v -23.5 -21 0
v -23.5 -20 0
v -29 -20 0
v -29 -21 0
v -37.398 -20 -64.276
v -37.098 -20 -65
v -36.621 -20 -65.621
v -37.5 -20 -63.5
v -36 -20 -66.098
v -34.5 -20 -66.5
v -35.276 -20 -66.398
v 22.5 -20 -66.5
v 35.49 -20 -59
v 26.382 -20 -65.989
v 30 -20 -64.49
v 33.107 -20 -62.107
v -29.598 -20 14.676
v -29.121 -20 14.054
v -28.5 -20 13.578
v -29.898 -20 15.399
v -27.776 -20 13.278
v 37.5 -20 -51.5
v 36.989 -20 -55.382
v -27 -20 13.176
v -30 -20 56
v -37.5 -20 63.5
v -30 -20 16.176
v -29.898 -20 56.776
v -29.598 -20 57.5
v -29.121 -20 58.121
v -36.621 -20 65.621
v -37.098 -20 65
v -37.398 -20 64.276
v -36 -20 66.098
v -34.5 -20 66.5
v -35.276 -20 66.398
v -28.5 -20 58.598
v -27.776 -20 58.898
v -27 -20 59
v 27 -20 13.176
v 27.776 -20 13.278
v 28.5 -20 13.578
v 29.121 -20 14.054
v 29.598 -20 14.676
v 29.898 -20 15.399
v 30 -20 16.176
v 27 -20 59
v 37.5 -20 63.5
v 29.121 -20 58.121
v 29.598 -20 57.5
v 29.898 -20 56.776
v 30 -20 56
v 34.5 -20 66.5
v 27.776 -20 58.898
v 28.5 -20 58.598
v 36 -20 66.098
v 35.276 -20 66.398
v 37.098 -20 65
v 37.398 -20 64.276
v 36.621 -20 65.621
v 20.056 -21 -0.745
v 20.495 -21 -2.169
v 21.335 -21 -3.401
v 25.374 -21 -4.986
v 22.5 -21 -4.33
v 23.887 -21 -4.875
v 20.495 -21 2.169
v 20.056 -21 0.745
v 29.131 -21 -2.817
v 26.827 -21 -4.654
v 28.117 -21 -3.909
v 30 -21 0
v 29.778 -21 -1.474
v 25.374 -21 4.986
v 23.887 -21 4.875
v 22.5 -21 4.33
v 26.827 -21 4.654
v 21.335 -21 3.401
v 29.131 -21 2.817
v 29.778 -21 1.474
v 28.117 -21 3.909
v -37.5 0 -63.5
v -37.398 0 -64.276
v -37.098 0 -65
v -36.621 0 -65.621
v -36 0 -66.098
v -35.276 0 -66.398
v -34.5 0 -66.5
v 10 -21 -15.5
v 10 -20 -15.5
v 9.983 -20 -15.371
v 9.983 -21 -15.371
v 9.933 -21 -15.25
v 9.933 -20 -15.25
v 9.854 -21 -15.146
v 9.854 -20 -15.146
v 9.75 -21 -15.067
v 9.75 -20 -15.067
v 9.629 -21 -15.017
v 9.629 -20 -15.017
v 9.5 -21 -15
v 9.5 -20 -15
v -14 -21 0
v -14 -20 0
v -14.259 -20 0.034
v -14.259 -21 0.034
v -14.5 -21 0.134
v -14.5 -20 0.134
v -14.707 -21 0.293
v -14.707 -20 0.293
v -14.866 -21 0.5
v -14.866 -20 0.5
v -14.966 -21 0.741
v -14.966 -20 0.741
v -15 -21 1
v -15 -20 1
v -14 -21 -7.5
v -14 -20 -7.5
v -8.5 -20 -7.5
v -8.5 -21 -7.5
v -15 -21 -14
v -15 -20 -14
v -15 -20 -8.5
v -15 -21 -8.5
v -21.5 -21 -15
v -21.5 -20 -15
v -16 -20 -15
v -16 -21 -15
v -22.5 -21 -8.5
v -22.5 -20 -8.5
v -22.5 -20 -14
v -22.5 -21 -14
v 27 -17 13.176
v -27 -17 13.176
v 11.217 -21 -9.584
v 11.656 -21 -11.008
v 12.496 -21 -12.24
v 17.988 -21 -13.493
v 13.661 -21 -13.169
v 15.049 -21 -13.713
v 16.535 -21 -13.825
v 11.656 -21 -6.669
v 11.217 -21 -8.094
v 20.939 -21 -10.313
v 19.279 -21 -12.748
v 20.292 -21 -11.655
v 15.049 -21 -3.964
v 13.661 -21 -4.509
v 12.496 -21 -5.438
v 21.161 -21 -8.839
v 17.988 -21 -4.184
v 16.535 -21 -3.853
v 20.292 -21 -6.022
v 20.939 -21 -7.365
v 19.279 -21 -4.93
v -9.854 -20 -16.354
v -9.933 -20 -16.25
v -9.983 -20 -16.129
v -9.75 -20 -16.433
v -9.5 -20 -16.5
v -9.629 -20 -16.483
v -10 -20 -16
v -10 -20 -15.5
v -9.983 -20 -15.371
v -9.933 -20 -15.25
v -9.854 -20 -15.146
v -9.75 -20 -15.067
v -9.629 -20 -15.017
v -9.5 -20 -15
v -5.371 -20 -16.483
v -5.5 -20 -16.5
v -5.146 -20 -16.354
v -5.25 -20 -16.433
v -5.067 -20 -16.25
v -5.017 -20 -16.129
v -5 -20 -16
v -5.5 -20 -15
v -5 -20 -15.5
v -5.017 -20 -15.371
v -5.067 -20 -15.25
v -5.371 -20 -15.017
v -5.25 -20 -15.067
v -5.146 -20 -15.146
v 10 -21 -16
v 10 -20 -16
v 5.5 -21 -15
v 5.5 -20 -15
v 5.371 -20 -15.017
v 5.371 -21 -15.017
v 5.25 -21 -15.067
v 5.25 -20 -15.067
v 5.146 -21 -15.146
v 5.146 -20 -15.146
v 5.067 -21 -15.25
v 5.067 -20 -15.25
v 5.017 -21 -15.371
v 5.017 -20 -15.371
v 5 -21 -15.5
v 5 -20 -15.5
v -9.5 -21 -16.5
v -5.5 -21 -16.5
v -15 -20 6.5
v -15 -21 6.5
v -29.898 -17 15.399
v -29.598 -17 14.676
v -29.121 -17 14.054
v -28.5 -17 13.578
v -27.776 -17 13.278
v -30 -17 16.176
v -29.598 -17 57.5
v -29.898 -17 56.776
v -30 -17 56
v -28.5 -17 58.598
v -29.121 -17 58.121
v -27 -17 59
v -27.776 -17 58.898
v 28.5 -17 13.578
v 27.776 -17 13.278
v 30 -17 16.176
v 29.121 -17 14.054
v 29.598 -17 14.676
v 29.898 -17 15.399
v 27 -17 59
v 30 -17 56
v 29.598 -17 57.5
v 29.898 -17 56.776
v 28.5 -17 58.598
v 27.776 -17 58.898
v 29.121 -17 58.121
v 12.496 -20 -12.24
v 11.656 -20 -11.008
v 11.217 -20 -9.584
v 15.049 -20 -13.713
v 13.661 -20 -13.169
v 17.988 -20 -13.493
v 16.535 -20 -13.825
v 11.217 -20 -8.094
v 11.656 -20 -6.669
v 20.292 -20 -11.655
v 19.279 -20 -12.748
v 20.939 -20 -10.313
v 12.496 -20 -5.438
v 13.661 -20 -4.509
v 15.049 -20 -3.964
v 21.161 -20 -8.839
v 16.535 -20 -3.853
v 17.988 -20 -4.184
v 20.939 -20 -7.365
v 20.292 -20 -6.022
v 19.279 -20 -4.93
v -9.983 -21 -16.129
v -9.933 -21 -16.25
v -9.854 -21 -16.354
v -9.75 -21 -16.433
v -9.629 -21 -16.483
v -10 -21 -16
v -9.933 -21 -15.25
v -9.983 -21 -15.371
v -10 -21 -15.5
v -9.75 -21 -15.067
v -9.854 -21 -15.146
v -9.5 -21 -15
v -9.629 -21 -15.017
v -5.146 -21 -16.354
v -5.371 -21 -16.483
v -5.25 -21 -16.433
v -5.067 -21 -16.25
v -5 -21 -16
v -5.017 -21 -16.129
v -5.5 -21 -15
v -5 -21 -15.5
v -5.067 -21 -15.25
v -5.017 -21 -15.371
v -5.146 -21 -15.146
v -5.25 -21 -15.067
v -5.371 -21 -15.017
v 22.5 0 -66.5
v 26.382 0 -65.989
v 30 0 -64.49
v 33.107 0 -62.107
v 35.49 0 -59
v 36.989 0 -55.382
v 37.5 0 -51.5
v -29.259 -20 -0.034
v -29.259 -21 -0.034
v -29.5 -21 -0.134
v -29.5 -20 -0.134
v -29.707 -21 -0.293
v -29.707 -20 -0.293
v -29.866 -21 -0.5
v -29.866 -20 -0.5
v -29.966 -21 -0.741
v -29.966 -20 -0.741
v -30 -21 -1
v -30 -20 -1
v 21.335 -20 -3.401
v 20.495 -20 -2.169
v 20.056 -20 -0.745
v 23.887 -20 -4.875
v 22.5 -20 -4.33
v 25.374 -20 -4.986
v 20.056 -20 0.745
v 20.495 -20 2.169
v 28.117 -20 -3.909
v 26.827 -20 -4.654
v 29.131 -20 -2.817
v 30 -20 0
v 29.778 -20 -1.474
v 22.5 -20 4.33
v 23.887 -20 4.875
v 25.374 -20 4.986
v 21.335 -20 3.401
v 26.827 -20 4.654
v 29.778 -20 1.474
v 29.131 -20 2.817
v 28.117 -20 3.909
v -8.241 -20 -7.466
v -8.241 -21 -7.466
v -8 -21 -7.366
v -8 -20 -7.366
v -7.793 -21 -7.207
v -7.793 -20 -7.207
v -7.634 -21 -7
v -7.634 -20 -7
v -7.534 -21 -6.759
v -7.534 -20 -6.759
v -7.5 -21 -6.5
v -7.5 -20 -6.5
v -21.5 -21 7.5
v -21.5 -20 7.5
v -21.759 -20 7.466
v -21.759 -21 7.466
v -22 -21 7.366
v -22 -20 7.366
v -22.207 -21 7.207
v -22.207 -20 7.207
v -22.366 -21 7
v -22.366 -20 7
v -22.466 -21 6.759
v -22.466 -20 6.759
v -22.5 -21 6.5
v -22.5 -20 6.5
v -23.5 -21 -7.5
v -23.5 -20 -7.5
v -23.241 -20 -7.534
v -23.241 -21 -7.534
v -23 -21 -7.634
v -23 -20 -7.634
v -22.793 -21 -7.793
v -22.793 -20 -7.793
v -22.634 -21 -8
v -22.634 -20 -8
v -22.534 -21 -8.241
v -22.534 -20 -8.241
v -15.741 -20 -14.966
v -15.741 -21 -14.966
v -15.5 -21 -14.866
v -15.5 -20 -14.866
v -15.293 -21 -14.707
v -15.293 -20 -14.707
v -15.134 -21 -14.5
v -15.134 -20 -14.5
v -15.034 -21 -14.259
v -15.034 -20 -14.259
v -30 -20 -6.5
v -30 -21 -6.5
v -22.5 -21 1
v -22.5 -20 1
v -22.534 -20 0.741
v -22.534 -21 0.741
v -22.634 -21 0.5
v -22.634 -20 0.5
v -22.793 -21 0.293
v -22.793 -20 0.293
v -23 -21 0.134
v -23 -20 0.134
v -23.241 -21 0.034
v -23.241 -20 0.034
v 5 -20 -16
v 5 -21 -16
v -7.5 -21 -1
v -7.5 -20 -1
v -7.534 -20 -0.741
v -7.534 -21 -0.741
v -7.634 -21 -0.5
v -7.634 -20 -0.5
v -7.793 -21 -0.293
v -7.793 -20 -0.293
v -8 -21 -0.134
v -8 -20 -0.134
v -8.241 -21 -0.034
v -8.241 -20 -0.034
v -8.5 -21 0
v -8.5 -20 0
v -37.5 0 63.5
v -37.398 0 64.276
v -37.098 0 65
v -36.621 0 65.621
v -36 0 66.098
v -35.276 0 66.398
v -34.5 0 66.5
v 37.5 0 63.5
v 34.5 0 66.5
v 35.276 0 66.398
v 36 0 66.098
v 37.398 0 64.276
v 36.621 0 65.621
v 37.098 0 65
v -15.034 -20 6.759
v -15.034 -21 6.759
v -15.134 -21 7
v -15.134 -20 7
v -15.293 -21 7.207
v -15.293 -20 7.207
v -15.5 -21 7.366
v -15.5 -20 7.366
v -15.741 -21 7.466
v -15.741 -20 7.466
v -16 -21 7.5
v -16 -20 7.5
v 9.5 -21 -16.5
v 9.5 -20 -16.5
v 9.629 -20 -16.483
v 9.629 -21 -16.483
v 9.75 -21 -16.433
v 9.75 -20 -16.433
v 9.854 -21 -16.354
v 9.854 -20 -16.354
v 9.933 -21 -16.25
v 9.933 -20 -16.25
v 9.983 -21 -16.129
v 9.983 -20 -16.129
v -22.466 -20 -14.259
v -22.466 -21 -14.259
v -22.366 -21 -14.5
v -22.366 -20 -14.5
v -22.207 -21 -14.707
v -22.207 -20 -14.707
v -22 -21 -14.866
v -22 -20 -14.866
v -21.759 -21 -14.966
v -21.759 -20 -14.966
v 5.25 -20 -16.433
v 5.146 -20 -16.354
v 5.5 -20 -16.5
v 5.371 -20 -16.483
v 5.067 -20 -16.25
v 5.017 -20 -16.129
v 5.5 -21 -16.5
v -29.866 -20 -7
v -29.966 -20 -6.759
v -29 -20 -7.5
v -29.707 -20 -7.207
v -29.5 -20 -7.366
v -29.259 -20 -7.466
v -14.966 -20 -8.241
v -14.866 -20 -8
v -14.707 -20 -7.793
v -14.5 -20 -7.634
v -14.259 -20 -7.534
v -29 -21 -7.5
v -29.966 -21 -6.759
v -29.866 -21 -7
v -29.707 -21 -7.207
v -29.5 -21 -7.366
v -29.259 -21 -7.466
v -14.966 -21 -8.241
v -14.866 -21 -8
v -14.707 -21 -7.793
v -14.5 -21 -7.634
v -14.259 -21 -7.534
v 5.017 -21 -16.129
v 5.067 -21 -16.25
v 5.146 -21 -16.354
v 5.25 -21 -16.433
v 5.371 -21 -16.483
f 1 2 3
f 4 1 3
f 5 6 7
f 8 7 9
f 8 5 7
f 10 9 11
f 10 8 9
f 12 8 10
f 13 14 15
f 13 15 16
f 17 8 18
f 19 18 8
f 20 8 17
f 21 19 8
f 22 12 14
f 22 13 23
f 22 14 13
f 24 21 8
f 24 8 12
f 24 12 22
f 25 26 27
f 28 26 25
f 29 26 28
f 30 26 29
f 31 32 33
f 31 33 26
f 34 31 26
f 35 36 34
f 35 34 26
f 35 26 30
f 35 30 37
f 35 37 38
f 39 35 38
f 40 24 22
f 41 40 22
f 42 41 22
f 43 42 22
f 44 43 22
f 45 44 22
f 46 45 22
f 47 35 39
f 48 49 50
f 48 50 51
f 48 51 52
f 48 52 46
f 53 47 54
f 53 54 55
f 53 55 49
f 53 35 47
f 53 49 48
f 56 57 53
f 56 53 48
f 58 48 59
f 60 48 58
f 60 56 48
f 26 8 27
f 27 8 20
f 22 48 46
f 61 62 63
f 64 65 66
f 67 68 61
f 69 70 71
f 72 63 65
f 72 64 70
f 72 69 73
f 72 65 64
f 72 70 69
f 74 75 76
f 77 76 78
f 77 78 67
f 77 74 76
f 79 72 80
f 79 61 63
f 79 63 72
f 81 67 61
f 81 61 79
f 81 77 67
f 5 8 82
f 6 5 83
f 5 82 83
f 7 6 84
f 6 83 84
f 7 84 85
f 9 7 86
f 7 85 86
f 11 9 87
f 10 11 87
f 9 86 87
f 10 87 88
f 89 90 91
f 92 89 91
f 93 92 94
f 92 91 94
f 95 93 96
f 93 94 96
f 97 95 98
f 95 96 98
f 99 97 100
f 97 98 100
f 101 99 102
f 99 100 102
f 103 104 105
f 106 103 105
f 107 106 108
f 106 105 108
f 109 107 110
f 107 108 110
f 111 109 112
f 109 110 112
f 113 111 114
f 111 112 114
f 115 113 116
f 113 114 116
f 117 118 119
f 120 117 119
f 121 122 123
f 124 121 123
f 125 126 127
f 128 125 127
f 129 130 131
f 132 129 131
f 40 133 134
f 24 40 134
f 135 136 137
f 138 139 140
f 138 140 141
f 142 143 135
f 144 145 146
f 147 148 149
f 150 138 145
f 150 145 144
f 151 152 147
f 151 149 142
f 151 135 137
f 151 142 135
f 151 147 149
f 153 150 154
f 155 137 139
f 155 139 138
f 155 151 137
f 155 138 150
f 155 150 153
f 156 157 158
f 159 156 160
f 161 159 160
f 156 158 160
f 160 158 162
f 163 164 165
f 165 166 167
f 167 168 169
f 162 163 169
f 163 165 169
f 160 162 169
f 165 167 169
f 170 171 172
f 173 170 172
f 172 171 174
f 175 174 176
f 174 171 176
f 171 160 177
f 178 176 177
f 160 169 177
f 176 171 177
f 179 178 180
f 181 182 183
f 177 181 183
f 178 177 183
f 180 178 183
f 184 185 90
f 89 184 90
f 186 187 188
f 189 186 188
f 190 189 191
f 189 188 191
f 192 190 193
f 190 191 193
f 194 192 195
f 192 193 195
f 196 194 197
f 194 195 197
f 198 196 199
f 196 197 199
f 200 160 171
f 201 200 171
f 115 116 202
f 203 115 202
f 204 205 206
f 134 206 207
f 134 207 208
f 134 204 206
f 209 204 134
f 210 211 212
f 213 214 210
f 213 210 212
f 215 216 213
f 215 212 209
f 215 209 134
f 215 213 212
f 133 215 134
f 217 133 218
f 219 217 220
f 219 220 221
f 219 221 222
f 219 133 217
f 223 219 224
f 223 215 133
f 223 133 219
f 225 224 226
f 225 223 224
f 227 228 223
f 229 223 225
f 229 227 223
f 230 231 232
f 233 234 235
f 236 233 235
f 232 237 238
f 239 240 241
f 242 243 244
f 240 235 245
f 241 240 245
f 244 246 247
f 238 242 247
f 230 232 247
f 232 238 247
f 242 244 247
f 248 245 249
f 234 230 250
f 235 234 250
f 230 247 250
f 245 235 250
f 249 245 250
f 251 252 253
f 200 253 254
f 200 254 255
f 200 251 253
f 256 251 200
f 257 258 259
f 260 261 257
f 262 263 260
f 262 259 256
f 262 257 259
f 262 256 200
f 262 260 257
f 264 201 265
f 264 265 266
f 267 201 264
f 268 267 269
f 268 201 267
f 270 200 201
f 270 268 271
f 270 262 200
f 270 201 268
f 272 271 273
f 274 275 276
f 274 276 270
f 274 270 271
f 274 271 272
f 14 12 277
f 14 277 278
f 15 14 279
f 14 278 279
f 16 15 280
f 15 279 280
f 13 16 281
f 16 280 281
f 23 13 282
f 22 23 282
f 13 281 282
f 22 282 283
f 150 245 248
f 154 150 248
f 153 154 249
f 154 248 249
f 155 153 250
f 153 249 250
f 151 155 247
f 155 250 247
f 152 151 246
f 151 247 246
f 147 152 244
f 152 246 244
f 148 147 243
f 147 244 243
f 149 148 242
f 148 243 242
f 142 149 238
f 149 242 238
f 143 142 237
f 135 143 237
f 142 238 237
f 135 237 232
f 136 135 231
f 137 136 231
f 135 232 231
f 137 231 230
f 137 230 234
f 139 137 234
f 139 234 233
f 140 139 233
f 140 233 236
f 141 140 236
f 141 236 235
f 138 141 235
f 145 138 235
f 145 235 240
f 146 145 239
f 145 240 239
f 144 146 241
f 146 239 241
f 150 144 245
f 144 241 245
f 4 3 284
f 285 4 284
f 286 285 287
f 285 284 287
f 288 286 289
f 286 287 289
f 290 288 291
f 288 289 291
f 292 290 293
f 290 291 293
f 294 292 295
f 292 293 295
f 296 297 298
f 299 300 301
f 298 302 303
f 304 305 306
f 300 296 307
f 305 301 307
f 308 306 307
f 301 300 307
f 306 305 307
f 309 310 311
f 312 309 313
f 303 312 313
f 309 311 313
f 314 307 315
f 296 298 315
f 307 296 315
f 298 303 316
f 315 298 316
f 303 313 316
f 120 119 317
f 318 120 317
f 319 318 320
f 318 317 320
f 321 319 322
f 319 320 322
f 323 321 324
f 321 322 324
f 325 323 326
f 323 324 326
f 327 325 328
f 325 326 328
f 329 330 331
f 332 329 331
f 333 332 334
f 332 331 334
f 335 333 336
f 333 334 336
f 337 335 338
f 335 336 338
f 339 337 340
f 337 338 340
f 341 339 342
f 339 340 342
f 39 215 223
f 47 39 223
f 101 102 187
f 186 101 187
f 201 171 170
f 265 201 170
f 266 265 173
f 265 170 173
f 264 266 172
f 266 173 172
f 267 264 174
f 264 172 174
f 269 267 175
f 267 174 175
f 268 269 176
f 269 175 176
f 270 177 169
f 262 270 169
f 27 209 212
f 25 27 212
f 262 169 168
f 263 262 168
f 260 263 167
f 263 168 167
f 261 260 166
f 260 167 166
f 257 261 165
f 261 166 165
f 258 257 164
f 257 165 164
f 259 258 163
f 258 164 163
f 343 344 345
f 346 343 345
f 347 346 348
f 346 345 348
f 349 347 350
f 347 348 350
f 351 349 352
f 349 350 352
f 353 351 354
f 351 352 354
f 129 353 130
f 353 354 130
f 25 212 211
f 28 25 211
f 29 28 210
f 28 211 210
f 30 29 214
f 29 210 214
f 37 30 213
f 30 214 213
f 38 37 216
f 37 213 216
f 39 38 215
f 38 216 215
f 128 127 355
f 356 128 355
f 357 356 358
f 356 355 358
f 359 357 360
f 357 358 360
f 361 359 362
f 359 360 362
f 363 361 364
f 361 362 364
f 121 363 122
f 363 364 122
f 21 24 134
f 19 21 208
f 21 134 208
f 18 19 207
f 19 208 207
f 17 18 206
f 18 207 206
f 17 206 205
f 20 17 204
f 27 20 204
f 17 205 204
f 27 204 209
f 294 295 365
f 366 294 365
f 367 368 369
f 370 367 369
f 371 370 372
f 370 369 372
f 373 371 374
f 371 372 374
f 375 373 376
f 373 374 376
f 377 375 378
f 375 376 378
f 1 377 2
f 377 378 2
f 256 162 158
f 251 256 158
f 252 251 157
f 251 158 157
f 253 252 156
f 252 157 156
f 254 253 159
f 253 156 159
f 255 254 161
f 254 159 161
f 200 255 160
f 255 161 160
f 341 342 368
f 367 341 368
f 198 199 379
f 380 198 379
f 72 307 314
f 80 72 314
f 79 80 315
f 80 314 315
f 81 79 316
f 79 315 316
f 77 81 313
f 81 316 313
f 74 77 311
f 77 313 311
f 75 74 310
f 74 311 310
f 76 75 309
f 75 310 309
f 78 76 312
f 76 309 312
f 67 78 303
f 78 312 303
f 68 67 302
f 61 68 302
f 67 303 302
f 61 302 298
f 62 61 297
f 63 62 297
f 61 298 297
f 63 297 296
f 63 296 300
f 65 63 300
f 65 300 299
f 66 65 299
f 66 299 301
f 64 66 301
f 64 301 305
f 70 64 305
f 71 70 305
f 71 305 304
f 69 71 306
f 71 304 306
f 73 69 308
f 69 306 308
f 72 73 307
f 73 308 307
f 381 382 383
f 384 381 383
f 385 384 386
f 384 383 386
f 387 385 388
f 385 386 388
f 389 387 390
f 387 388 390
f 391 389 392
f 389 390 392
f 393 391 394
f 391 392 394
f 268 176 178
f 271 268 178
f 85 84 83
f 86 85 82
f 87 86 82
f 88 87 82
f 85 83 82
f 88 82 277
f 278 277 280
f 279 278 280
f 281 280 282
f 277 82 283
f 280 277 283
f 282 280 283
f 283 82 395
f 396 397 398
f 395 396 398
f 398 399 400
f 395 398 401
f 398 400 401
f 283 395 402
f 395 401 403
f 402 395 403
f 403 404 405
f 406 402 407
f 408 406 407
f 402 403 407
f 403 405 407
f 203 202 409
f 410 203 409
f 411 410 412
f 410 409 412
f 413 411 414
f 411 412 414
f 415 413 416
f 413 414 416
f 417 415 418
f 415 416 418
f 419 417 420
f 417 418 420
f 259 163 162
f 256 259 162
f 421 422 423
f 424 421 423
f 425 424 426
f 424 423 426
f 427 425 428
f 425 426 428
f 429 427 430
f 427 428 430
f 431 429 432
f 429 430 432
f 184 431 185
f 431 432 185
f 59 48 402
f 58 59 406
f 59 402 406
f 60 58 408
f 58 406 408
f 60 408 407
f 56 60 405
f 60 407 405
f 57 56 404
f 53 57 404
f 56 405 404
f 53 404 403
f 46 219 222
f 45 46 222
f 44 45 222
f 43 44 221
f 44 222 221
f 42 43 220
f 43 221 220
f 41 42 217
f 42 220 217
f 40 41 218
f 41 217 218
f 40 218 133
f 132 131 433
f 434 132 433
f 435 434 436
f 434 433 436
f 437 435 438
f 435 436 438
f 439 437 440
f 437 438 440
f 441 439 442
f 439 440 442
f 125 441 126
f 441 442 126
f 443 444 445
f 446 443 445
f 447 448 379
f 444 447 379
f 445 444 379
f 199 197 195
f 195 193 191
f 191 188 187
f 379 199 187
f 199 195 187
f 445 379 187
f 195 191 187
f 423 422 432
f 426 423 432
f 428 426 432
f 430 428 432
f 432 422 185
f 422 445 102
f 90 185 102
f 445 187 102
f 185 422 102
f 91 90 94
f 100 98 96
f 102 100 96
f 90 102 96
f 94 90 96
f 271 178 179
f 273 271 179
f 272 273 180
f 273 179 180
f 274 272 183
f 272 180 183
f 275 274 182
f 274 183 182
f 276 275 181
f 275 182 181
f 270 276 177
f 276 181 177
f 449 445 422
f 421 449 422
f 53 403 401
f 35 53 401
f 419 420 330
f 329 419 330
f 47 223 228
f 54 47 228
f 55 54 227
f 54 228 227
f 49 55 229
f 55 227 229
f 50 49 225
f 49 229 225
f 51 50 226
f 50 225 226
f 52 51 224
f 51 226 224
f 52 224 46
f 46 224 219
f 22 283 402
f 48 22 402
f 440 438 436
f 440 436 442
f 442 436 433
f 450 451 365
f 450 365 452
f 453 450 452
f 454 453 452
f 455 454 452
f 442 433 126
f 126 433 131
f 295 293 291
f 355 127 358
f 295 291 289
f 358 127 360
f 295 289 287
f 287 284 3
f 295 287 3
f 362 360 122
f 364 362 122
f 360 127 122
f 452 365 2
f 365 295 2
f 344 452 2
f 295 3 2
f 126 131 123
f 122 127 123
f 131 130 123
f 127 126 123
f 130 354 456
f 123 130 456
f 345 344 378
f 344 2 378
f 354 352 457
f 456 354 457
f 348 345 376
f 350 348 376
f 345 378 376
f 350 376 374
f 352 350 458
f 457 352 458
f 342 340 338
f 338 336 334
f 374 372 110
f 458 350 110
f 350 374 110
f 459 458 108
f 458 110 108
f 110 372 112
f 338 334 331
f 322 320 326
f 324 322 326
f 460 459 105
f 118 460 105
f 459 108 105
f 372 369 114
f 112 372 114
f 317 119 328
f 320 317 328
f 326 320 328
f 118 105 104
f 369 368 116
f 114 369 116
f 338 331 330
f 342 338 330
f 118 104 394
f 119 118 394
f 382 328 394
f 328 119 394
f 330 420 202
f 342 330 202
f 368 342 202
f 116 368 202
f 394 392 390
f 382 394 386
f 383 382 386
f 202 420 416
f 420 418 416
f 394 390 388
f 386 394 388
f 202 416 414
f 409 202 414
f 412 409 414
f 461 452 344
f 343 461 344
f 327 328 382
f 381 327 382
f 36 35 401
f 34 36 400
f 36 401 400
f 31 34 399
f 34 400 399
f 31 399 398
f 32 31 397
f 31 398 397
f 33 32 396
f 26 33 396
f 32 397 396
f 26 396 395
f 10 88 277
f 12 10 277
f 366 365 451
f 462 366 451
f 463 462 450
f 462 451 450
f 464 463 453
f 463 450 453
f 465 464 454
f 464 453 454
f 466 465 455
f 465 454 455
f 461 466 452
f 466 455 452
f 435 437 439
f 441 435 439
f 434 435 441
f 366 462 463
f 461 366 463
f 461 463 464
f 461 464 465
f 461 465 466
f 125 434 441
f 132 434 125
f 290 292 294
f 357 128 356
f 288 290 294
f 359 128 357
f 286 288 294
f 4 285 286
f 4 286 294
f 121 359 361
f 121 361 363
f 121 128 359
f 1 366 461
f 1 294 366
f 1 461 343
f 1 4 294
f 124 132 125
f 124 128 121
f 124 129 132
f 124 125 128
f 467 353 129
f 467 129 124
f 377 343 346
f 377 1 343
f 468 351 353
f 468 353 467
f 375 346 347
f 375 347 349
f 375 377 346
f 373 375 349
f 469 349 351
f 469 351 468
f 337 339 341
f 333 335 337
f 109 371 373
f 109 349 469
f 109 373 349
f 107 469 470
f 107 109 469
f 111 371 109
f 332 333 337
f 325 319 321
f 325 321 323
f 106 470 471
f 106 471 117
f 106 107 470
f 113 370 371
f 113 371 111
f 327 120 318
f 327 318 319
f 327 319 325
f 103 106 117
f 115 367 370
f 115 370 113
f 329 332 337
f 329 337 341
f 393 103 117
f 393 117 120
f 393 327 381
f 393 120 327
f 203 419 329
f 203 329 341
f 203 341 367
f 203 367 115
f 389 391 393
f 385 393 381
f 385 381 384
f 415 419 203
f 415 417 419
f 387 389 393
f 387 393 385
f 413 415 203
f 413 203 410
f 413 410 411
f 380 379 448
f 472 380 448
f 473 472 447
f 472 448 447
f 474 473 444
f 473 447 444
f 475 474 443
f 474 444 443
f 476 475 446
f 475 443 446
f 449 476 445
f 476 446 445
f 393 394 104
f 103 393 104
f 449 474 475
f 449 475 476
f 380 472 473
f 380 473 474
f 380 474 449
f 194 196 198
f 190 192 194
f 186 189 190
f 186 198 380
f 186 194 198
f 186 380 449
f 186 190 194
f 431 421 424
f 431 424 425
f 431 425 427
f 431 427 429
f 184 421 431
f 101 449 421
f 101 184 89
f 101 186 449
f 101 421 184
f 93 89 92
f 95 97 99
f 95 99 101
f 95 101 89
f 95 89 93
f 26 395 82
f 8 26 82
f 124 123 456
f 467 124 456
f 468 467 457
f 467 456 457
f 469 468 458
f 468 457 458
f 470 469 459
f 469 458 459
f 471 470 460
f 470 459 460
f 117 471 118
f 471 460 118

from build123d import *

# Parameters (mm, degrees)
F1_DEPTH = 20
F2_DEPTH = 17
F3_R     = 5
F4_DEPTH = 1


with BuildPart() as f1:
    # F0 (on Front) → F1 (new body)
    with BuildSketch(Plane.XZ):
        with BuildLine():
            ThreePointArc((37.5, 63.5), (36.62132, 65.62132), (34.5, 66.5))
            Line((34.5, 66.5), (-34.5, 66.5))
            ThreePointArc((-34.5, 66.5), (-36.62132, 65.62132), (-37.5, 63.5))
            Line((-37.5, 63.5), (-37.5, -63.5))
            ThreePointArc((-37.5, -63.5), (-36.62132, -65.62132), (-34.5, -66.5))
            Line((-34.5, -66.5), (22.5, -66.5))
            ThreePointArc((22.5, -66.5), (33.106602, -62.106602), (37.5, -51.5))
            Line((37.5, -51.5), (37.5, 63.5))
        make_face()
        with BuildLine():
            ThreePointArc((-30, 56), (-29.12132, 58.12132), (-27, 59))
            Line((-27, 59), (27, 59))
            ThreePointArc((27, 59), (29.12132, 58.12132), (30, 56))
            Line((30, 56), (30, 16.175728))
            ThreePointArc((30, 16.175728), (29.12132, 14.054407), (27, 13.175728))
            Line((27, 13.175728), (-27, 13.175728))
            ThreePointArc((-27, 13.175728), (-29.12132, 14.054407), (-30, 16.175728))
            Line((-30, 16.175728), (-30, 56))
        make_face(mode=Mode.SUBTRACT)
    extrude(amount=F1_DEPTH)

    # F0 (on Front) → F2 (join)
    with BuildSketch(Plane.XZ):
        with BuildLine():
            Line((27, 59), (-27, 59))
            ThreePointArc((-27, 59), (-29.12132, 58.12132), (-30, 56))
            Line((-30, 56), (-30, 16.175728))
            ThreePointArc((-30, 16.175728), (-29.12132, 14.054407), (-27, 13.175728))
            Line((-27, 13.175728), (27, 13.175728))
            ThreePointArc((27, 13.175728), (29.12132, 14.054407), (30, 16.175728))
            Line((30, 16.175728), (30, 56))
            ThreePointArc((30, 56), (29.12132, 58.12132), (27, 59))
        make_face()
    extrude(amount=F2_DEPTH)


with BuildPart() as f4:
    # F3 (on face) → F4 (new body)
    with BuildSketch(Plane.XZ.offset(20)):
        with BuildLine():
            Line((-16, 7.5), (-21.5, 7.5))
            ThreePointArc((-21.5, 7.5), (-22.207107, 7.207107), (-22.5, 6.5))
            Line((-22.5, 6.5), (-22.5, 1))
            ThreePointArc((-22.5, 1), (-22.792893, 0.292893), (-23.5, 0))
            Line((-23.5, 0), (-29, 0))
            ThreePointArc((-29, 0), (-29.707107, -0.292893), (-30, -1))
            Line((-30, -1), (-30, -6.5))
            ThreePointArc((-30, -6.5), (-29.707107, -7.207107), (-29, -7.5))
            Line((-29, -7.5), (-23.5, -7.5))
            ThreePointArc((-23.5, -7.5), (-22.792893, -7.792893), (-22.5, -8.5))
            Line((-22.5, -8.5), (-22.5, -14))
            ThreePointArc((-22.5, -14), (-22.207107, -14.707107), (-21.5, -15))
            Line((-21.5, -15), (-16, -15))
            ThreePointArc((-16, -15), (-15.292893, -14.707107), (-15, -14))
            Line((-15, -14), (-15, -8.5))
            ThreePointArc((-15, -8.5), (-14.707107, -7.792893), (-14, -7.5))
            Line((-14, -7.5), (-8.5, -7.5))
            ThreePointArc((-8.5, -7.5), (-7.792893, -7.207107), (-7.5, -6.5))
            Line((-7.5, -6.5), (-7.5, -1))
            ThreePointArc((-7.5, -1), (-7.792893, -0.292893), (-8.5, 0))
            Line((-8.5, 0), (-14, 0))
            ThreePointArc((-14, 0), (-14.707107, 0.292893), (-15, 1))
            Line((-15, 1), (-15, 6.5))
            ThreePointArc((-15, 6.5), (-15.292893, 7.207107), (-16, 7.5))
        make_face()
        with BuildLine():
            Line((-5.5, -15), (-9.5, -15))
            ThreePointArc((-9.5, -15), (-9.853553, -15.146447), (-10, -15.5))
            Line((-10, -15.5), (-10, -16))
            ThreePointArc((-10, -16), (-9.853553, -16.353553), (-9.5, -16.5))
            Line((-9.5, -16.5), (-5.5, -16.5))
            ThreePointArc((-5.5, -16.5), (-5.146447, -16.353553), (-5, -16))
            Line((-5, -16), (-5, -15.5))
            ThreePointArc((-5, -15.5), (-5.146447, -15.146447), (-5.5, -15))
        make_face()
        with BuildLine():
            Line((9.5, -15), (5.5, -15))
            ThreePointArc((5.5, -15), (5.146447, -15.146447), (5, -15.5))
            Line((5, -15.5), (5, -16))
            ThreePointArc((5, -16), (5.146447, -16.353553), (5.5, -16.5))
            Line((5.5, -16.5), (9.5, -16.5))
            ThreePointArc((9.5, -16.5), (9.853553, -16.353553), (10, -16))
            Line((10, -16), (10, -15.5))
            ThreePointArc((10, -15.5), (9.853553, -15.146447), (9.5, -15))
        make_face()
        with Locations((16.161165, -8.838835)):
            Circle(F3_R)
        with Locations((25, 0)):
            Circle(F3_R)
    extrude(amount=F4_DEPTH)


solid = Compound([f1.part, f4.part])
